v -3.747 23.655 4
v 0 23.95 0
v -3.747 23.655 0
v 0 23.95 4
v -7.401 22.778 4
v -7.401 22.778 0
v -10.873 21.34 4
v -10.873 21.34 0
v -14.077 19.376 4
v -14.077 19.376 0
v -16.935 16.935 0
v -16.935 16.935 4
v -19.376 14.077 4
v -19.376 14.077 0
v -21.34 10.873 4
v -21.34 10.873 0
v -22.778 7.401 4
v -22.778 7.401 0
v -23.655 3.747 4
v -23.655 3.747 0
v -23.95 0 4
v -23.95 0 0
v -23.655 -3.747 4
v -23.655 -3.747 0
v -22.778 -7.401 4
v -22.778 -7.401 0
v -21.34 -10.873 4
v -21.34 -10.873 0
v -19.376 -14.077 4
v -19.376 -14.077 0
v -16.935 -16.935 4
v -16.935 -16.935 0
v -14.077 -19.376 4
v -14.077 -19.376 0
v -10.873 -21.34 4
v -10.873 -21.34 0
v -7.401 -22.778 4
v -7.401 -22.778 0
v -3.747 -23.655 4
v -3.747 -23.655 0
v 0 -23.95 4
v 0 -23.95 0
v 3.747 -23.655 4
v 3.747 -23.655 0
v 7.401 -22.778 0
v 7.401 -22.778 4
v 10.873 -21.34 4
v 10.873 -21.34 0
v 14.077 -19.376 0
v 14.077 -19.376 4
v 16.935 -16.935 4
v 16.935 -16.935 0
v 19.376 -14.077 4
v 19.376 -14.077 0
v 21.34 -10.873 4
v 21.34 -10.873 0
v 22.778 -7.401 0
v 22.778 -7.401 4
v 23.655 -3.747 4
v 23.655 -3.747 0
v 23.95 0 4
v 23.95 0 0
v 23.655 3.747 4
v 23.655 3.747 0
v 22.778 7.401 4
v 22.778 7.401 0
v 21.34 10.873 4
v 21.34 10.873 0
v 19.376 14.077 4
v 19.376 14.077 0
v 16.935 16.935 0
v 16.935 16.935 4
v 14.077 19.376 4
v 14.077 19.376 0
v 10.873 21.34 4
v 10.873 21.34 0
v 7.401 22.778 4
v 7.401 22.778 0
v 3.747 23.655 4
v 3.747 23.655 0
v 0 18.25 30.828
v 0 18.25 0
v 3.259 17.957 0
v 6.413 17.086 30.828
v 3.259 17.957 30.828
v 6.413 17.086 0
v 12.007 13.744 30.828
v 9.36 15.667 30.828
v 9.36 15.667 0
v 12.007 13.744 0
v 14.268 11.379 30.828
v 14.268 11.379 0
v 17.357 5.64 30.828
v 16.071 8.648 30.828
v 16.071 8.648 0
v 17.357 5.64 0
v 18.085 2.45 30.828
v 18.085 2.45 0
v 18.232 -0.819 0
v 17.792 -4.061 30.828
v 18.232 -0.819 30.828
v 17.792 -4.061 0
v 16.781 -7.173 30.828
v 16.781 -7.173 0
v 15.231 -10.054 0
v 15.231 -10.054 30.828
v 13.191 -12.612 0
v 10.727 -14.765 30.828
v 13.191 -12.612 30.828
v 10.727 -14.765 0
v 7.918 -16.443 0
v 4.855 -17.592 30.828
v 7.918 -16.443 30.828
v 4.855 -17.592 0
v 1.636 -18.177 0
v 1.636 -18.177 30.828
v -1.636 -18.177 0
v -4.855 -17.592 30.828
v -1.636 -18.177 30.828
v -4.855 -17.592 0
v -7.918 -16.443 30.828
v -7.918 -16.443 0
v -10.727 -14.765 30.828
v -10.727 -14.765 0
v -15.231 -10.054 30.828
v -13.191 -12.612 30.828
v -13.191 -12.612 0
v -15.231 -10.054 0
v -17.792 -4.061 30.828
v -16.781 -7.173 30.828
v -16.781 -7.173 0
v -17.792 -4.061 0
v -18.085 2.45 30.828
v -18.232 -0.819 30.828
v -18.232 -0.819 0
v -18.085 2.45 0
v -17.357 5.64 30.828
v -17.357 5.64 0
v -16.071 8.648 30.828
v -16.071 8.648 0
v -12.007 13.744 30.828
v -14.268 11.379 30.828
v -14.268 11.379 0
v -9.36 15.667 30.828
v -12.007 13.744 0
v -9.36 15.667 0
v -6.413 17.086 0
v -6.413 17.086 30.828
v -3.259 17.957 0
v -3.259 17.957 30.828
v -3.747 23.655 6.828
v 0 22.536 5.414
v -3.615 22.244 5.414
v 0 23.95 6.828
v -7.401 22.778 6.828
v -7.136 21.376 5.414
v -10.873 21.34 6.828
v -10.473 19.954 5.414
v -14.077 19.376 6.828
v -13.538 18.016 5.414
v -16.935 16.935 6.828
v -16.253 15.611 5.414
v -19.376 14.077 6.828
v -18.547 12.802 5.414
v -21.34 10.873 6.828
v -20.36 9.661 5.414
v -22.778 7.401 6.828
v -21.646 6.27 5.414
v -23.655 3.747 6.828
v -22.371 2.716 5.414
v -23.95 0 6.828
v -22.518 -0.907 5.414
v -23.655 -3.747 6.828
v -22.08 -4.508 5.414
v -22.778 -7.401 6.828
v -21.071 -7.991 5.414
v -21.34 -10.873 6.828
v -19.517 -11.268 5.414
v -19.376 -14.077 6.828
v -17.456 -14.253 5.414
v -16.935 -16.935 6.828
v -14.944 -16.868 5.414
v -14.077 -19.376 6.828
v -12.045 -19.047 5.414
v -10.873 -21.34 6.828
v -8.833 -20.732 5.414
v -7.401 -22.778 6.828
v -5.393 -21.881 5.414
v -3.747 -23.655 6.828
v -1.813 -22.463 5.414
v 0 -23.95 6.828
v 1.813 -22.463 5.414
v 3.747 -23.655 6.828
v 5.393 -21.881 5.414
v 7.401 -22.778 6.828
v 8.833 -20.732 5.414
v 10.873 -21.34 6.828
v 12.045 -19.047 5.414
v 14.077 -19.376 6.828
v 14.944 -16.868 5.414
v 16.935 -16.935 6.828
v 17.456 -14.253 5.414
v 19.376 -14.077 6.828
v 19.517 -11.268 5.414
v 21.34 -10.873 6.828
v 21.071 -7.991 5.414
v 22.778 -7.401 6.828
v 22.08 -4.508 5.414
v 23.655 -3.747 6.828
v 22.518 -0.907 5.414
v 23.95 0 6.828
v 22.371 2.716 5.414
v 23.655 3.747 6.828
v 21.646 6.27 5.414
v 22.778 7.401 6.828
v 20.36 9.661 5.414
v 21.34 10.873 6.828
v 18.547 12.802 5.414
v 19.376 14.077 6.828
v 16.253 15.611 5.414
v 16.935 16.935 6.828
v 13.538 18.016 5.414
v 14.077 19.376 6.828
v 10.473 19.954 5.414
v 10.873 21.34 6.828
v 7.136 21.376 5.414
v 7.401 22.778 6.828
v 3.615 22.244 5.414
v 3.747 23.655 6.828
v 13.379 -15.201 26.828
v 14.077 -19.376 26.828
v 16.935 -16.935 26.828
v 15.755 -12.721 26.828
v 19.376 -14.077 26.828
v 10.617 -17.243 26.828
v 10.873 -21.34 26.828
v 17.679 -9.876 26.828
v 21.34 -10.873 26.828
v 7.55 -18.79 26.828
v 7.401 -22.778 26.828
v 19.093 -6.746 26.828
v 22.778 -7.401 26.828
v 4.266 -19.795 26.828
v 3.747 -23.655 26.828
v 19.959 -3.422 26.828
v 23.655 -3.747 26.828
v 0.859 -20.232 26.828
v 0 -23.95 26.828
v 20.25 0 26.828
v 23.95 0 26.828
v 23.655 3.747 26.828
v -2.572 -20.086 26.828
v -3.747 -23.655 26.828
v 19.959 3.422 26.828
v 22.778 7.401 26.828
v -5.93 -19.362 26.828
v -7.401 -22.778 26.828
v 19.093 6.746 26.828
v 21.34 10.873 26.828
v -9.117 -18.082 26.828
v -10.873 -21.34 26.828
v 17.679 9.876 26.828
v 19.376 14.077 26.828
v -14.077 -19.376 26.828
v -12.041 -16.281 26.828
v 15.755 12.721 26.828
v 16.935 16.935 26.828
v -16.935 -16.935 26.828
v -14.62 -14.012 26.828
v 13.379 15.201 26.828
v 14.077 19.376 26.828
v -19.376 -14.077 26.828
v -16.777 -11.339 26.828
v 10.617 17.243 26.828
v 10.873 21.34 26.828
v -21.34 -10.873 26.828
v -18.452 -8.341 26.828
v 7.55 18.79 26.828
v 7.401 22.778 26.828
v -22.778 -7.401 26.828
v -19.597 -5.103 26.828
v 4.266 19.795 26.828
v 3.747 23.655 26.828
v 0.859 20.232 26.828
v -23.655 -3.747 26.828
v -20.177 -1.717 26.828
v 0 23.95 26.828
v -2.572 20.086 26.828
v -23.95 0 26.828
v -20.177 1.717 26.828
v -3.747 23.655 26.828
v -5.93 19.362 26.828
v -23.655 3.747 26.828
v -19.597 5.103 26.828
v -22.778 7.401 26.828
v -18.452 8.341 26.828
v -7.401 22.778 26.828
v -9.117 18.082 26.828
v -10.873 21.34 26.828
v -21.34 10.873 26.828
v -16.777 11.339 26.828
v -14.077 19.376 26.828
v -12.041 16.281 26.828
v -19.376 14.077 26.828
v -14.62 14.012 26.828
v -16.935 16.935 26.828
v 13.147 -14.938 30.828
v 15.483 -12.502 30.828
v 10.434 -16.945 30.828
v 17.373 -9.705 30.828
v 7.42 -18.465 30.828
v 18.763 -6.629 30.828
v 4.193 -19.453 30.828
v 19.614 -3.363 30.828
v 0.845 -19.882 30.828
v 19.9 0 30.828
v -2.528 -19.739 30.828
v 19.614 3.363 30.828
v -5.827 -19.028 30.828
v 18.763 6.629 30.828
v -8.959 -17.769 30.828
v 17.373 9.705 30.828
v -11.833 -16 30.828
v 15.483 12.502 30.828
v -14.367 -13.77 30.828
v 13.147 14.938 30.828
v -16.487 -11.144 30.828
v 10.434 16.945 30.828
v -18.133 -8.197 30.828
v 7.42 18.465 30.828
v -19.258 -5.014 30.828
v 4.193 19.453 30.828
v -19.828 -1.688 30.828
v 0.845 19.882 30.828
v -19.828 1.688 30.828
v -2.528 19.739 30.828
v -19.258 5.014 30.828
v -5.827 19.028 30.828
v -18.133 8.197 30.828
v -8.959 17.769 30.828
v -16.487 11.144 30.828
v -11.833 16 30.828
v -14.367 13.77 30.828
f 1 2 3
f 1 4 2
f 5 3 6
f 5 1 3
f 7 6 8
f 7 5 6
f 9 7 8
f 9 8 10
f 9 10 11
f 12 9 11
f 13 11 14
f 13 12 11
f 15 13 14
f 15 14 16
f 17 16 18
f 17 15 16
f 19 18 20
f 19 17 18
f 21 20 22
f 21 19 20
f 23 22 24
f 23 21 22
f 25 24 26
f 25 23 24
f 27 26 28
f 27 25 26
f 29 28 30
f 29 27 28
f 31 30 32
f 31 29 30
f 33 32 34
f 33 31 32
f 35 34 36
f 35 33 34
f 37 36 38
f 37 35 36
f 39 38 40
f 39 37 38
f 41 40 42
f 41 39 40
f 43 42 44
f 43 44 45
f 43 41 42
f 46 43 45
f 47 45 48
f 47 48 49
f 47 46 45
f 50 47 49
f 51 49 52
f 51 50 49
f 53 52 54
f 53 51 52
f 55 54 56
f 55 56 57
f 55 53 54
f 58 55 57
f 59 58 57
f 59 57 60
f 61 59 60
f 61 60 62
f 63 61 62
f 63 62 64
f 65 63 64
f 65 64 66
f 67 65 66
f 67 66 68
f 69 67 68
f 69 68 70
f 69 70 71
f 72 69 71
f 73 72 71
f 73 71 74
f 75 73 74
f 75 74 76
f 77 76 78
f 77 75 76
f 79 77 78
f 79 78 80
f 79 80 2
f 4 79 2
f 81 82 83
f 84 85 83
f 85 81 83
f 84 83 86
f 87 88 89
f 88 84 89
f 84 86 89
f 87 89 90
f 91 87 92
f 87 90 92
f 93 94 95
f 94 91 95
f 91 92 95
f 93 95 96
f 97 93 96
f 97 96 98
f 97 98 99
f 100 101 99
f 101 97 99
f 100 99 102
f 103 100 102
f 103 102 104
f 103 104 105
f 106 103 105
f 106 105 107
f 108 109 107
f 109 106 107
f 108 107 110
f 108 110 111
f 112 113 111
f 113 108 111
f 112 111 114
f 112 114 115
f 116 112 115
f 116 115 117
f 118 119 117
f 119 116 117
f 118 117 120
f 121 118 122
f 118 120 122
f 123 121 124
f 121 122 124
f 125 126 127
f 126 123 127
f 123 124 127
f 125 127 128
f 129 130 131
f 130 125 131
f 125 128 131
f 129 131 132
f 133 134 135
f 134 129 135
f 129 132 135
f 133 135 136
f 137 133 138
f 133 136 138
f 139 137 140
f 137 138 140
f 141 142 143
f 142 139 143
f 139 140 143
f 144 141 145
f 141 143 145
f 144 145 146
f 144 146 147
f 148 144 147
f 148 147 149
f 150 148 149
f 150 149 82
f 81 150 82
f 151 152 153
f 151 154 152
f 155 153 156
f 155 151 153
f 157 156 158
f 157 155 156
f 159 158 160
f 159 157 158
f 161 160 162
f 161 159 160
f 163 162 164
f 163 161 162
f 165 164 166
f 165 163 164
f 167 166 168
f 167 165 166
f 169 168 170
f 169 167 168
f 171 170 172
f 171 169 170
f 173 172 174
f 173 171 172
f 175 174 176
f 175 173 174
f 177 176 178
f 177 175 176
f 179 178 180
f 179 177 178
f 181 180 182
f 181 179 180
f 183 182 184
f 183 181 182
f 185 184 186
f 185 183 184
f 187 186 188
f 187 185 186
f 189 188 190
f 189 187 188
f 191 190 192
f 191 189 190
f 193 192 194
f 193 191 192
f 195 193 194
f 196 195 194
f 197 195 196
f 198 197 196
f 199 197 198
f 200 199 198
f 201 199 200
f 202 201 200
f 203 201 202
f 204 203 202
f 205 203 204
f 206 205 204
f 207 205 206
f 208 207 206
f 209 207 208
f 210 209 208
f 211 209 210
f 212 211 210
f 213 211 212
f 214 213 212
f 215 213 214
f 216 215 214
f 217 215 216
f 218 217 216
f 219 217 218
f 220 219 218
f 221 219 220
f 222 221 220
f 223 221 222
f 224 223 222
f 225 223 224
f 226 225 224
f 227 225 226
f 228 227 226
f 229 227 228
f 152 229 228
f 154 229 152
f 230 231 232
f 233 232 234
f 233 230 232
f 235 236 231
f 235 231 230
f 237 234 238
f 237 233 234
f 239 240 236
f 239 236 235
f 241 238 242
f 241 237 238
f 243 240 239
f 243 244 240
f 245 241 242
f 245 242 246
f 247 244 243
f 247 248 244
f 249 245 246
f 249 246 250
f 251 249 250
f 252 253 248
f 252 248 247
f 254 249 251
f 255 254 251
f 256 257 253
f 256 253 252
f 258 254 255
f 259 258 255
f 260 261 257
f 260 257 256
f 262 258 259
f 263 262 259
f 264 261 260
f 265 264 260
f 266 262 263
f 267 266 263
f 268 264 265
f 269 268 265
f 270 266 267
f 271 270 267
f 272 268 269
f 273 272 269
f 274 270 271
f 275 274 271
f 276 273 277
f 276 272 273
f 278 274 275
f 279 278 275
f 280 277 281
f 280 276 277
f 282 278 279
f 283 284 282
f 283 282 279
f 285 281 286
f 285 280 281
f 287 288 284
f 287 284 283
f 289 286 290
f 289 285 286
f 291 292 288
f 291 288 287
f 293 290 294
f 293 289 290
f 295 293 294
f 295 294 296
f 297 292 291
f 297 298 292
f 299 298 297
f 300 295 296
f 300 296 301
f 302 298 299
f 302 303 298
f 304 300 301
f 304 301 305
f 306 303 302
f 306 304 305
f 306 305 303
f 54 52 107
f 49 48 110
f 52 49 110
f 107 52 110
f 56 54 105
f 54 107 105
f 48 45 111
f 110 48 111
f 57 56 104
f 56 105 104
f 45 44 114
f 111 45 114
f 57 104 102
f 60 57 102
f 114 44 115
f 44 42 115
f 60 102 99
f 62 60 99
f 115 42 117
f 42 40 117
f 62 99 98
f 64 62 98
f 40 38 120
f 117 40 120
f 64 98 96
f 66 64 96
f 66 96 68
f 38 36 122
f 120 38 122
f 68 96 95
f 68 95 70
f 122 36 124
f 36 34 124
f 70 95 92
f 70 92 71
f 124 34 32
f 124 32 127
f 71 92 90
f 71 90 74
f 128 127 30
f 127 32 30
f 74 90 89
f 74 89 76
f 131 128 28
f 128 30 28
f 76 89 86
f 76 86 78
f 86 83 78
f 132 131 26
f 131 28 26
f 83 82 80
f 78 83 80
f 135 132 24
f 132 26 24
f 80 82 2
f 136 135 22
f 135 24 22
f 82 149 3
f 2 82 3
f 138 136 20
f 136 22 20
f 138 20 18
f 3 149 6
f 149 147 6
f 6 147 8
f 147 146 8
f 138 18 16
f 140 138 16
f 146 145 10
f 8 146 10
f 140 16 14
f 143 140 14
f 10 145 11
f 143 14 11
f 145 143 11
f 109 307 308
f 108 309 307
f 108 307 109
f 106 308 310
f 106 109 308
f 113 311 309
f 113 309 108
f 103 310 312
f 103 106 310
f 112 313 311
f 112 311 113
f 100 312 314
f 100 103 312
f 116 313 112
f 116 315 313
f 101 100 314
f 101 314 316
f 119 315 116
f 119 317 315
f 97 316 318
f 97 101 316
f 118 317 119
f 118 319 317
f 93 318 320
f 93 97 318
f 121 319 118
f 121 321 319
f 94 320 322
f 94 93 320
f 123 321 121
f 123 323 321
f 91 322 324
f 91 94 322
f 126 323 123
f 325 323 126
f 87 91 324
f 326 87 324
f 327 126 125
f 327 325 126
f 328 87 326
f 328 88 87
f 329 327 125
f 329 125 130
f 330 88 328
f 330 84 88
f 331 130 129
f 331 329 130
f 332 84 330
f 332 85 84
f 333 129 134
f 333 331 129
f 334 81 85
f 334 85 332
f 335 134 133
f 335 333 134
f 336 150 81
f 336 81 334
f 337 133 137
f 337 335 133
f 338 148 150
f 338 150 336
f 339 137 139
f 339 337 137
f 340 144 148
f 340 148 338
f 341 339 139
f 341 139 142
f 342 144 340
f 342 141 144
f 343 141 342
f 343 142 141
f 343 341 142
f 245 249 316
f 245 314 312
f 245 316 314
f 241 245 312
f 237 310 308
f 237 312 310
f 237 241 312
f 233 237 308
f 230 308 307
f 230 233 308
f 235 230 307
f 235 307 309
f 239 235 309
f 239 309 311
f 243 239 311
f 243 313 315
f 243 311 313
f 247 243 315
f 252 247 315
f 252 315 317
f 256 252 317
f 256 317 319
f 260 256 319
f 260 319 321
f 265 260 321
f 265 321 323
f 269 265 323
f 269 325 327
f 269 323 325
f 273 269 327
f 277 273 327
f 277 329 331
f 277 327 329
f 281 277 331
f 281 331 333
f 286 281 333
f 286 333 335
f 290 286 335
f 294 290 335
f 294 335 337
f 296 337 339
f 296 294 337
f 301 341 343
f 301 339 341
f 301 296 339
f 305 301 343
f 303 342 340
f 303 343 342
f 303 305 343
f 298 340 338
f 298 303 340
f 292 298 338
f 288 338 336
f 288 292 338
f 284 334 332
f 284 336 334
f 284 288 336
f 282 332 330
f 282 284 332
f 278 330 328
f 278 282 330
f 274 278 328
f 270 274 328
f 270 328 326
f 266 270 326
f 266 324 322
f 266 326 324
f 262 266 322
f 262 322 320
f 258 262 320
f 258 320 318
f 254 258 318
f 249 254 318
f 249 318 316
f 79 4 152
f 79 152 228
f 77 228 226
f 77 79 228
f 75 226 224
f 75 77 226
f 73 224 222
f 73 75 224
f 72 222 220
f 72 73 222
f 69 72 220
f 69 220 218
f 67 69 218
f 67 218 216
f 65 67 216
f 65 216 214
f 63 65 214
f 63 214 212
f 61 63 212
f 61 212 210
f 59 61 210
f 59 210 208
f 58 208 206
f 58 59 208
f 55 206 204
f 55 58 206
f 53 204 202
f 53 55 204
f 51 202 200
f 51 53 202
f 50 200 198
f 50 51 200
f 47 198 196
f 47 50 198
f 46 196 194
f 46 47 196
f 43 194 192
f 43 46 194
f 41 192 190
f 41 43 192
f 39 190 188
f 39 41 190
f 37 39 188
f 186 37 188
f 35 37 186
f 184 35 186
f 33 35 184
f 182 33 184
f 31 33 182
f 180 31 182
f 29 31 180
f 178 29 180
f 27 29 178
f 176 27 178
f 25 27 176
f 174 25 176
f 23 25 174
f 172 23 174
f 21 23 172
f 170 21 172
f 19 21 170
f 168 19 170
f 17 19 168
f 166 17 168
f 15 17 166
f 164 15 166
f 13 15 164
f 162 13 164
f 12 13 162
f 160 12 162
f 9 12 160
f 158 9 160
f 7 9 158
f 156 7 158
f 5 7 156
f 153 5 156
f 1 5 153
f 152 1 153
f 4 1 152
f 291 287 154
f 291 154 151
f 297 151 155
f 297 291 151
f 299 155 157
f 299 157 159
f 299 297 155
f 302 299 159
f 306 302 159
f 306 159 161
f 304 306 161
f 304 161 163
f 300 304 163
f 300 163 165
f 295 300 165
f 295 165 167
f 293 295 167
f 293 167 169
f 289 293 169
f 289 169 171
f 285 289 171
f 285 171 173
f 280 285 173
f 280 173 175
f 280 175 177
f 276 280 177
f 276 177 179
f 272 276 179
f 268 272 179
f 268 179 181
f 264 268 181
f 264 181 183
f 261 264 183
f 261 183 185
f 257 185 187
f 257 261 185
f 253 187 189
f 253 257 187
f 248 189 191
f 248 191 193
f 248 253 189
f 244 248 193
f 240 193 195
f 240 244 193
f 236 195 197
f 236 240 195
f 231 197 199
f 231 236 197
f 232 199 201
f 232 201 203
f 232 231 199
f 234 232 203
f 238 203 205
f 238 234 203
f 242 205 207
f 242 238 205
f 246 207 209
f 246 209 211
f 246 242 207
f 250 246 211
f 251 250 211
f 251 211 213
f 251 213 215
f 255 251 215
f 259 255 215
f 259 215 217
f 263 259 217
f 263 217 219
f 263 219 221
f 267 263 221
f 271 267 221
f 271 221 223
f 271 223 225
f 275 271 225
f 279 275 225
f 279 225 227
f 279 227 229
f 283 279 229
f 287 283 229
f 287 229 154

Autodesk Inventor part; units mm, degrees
ref_plane "YZ Plane" through (0, 0, 0) normal (1, 0, 0) x (0, 1, 0)
ref_plane "XZ Plane" through (0, 0, 0) normal (0, 1, 0) x (-1, 0, 0)
ref_plane "XY Plane" through (0, 0, 0) normal (0, 0, 1) x (1, 0, 0)
sketch "Skizze1" plane through (0, 0, 0) normal (1, 0, 0) x (0, 1, 0)
  line L0 (23.95, 0) -> (23.95, 4)
  line L1 (23.95, 4) -> (22.5358, 5.4142)
  line L2 (22.5358, 5.4142) -> (23.95, 6.8284)
  line L3 (23.95, 6.8284) -> (23.95, 26.8284)
  line L4 (23.95, 26.8284) -> (20.25, 26.8284)
  line L5 (20.25, 26.8284) -> (20.25, 30.8284)
  line L6 (20.25, 30.8284) -> (18.25, 30.8284)
  line L7 (18.25, 30.8284) -> (18.25, 0)
  line L8 (18.25, 0) -> (23.95, 0)
  line L9 (0, -6.1657) -> (0, 36.9941) projected
  point P0 (0, 0)
  dimension "d0" = 4
  dimension "d1" = 2
  dimension "d2" = 135
  dimension "d3" = 20
  dimension "d4" = 23.95
  dimension "d5" = 20.25
  dimension "d6" = 4
  dimension "d7" = 2
revolve "Umdrehung1" add sketch "Skizze1" angle 360 about axis through (0, 0, -10) along (0, 0, 1)
sketch "Skizze2" plane through (0, 0, 26.8284) normal (0, 0, 1) x (1, 0, 0)
  circle A0 centre (0, 0) radius 20.25 projected
  circle A1 centre (0, 0) radius 23.95 projected
extrude "Extrusion1" cut sketch "Skizze2" along normal up to surface (4 mm away) draft 5
properties part number "00_microscope_turret"
